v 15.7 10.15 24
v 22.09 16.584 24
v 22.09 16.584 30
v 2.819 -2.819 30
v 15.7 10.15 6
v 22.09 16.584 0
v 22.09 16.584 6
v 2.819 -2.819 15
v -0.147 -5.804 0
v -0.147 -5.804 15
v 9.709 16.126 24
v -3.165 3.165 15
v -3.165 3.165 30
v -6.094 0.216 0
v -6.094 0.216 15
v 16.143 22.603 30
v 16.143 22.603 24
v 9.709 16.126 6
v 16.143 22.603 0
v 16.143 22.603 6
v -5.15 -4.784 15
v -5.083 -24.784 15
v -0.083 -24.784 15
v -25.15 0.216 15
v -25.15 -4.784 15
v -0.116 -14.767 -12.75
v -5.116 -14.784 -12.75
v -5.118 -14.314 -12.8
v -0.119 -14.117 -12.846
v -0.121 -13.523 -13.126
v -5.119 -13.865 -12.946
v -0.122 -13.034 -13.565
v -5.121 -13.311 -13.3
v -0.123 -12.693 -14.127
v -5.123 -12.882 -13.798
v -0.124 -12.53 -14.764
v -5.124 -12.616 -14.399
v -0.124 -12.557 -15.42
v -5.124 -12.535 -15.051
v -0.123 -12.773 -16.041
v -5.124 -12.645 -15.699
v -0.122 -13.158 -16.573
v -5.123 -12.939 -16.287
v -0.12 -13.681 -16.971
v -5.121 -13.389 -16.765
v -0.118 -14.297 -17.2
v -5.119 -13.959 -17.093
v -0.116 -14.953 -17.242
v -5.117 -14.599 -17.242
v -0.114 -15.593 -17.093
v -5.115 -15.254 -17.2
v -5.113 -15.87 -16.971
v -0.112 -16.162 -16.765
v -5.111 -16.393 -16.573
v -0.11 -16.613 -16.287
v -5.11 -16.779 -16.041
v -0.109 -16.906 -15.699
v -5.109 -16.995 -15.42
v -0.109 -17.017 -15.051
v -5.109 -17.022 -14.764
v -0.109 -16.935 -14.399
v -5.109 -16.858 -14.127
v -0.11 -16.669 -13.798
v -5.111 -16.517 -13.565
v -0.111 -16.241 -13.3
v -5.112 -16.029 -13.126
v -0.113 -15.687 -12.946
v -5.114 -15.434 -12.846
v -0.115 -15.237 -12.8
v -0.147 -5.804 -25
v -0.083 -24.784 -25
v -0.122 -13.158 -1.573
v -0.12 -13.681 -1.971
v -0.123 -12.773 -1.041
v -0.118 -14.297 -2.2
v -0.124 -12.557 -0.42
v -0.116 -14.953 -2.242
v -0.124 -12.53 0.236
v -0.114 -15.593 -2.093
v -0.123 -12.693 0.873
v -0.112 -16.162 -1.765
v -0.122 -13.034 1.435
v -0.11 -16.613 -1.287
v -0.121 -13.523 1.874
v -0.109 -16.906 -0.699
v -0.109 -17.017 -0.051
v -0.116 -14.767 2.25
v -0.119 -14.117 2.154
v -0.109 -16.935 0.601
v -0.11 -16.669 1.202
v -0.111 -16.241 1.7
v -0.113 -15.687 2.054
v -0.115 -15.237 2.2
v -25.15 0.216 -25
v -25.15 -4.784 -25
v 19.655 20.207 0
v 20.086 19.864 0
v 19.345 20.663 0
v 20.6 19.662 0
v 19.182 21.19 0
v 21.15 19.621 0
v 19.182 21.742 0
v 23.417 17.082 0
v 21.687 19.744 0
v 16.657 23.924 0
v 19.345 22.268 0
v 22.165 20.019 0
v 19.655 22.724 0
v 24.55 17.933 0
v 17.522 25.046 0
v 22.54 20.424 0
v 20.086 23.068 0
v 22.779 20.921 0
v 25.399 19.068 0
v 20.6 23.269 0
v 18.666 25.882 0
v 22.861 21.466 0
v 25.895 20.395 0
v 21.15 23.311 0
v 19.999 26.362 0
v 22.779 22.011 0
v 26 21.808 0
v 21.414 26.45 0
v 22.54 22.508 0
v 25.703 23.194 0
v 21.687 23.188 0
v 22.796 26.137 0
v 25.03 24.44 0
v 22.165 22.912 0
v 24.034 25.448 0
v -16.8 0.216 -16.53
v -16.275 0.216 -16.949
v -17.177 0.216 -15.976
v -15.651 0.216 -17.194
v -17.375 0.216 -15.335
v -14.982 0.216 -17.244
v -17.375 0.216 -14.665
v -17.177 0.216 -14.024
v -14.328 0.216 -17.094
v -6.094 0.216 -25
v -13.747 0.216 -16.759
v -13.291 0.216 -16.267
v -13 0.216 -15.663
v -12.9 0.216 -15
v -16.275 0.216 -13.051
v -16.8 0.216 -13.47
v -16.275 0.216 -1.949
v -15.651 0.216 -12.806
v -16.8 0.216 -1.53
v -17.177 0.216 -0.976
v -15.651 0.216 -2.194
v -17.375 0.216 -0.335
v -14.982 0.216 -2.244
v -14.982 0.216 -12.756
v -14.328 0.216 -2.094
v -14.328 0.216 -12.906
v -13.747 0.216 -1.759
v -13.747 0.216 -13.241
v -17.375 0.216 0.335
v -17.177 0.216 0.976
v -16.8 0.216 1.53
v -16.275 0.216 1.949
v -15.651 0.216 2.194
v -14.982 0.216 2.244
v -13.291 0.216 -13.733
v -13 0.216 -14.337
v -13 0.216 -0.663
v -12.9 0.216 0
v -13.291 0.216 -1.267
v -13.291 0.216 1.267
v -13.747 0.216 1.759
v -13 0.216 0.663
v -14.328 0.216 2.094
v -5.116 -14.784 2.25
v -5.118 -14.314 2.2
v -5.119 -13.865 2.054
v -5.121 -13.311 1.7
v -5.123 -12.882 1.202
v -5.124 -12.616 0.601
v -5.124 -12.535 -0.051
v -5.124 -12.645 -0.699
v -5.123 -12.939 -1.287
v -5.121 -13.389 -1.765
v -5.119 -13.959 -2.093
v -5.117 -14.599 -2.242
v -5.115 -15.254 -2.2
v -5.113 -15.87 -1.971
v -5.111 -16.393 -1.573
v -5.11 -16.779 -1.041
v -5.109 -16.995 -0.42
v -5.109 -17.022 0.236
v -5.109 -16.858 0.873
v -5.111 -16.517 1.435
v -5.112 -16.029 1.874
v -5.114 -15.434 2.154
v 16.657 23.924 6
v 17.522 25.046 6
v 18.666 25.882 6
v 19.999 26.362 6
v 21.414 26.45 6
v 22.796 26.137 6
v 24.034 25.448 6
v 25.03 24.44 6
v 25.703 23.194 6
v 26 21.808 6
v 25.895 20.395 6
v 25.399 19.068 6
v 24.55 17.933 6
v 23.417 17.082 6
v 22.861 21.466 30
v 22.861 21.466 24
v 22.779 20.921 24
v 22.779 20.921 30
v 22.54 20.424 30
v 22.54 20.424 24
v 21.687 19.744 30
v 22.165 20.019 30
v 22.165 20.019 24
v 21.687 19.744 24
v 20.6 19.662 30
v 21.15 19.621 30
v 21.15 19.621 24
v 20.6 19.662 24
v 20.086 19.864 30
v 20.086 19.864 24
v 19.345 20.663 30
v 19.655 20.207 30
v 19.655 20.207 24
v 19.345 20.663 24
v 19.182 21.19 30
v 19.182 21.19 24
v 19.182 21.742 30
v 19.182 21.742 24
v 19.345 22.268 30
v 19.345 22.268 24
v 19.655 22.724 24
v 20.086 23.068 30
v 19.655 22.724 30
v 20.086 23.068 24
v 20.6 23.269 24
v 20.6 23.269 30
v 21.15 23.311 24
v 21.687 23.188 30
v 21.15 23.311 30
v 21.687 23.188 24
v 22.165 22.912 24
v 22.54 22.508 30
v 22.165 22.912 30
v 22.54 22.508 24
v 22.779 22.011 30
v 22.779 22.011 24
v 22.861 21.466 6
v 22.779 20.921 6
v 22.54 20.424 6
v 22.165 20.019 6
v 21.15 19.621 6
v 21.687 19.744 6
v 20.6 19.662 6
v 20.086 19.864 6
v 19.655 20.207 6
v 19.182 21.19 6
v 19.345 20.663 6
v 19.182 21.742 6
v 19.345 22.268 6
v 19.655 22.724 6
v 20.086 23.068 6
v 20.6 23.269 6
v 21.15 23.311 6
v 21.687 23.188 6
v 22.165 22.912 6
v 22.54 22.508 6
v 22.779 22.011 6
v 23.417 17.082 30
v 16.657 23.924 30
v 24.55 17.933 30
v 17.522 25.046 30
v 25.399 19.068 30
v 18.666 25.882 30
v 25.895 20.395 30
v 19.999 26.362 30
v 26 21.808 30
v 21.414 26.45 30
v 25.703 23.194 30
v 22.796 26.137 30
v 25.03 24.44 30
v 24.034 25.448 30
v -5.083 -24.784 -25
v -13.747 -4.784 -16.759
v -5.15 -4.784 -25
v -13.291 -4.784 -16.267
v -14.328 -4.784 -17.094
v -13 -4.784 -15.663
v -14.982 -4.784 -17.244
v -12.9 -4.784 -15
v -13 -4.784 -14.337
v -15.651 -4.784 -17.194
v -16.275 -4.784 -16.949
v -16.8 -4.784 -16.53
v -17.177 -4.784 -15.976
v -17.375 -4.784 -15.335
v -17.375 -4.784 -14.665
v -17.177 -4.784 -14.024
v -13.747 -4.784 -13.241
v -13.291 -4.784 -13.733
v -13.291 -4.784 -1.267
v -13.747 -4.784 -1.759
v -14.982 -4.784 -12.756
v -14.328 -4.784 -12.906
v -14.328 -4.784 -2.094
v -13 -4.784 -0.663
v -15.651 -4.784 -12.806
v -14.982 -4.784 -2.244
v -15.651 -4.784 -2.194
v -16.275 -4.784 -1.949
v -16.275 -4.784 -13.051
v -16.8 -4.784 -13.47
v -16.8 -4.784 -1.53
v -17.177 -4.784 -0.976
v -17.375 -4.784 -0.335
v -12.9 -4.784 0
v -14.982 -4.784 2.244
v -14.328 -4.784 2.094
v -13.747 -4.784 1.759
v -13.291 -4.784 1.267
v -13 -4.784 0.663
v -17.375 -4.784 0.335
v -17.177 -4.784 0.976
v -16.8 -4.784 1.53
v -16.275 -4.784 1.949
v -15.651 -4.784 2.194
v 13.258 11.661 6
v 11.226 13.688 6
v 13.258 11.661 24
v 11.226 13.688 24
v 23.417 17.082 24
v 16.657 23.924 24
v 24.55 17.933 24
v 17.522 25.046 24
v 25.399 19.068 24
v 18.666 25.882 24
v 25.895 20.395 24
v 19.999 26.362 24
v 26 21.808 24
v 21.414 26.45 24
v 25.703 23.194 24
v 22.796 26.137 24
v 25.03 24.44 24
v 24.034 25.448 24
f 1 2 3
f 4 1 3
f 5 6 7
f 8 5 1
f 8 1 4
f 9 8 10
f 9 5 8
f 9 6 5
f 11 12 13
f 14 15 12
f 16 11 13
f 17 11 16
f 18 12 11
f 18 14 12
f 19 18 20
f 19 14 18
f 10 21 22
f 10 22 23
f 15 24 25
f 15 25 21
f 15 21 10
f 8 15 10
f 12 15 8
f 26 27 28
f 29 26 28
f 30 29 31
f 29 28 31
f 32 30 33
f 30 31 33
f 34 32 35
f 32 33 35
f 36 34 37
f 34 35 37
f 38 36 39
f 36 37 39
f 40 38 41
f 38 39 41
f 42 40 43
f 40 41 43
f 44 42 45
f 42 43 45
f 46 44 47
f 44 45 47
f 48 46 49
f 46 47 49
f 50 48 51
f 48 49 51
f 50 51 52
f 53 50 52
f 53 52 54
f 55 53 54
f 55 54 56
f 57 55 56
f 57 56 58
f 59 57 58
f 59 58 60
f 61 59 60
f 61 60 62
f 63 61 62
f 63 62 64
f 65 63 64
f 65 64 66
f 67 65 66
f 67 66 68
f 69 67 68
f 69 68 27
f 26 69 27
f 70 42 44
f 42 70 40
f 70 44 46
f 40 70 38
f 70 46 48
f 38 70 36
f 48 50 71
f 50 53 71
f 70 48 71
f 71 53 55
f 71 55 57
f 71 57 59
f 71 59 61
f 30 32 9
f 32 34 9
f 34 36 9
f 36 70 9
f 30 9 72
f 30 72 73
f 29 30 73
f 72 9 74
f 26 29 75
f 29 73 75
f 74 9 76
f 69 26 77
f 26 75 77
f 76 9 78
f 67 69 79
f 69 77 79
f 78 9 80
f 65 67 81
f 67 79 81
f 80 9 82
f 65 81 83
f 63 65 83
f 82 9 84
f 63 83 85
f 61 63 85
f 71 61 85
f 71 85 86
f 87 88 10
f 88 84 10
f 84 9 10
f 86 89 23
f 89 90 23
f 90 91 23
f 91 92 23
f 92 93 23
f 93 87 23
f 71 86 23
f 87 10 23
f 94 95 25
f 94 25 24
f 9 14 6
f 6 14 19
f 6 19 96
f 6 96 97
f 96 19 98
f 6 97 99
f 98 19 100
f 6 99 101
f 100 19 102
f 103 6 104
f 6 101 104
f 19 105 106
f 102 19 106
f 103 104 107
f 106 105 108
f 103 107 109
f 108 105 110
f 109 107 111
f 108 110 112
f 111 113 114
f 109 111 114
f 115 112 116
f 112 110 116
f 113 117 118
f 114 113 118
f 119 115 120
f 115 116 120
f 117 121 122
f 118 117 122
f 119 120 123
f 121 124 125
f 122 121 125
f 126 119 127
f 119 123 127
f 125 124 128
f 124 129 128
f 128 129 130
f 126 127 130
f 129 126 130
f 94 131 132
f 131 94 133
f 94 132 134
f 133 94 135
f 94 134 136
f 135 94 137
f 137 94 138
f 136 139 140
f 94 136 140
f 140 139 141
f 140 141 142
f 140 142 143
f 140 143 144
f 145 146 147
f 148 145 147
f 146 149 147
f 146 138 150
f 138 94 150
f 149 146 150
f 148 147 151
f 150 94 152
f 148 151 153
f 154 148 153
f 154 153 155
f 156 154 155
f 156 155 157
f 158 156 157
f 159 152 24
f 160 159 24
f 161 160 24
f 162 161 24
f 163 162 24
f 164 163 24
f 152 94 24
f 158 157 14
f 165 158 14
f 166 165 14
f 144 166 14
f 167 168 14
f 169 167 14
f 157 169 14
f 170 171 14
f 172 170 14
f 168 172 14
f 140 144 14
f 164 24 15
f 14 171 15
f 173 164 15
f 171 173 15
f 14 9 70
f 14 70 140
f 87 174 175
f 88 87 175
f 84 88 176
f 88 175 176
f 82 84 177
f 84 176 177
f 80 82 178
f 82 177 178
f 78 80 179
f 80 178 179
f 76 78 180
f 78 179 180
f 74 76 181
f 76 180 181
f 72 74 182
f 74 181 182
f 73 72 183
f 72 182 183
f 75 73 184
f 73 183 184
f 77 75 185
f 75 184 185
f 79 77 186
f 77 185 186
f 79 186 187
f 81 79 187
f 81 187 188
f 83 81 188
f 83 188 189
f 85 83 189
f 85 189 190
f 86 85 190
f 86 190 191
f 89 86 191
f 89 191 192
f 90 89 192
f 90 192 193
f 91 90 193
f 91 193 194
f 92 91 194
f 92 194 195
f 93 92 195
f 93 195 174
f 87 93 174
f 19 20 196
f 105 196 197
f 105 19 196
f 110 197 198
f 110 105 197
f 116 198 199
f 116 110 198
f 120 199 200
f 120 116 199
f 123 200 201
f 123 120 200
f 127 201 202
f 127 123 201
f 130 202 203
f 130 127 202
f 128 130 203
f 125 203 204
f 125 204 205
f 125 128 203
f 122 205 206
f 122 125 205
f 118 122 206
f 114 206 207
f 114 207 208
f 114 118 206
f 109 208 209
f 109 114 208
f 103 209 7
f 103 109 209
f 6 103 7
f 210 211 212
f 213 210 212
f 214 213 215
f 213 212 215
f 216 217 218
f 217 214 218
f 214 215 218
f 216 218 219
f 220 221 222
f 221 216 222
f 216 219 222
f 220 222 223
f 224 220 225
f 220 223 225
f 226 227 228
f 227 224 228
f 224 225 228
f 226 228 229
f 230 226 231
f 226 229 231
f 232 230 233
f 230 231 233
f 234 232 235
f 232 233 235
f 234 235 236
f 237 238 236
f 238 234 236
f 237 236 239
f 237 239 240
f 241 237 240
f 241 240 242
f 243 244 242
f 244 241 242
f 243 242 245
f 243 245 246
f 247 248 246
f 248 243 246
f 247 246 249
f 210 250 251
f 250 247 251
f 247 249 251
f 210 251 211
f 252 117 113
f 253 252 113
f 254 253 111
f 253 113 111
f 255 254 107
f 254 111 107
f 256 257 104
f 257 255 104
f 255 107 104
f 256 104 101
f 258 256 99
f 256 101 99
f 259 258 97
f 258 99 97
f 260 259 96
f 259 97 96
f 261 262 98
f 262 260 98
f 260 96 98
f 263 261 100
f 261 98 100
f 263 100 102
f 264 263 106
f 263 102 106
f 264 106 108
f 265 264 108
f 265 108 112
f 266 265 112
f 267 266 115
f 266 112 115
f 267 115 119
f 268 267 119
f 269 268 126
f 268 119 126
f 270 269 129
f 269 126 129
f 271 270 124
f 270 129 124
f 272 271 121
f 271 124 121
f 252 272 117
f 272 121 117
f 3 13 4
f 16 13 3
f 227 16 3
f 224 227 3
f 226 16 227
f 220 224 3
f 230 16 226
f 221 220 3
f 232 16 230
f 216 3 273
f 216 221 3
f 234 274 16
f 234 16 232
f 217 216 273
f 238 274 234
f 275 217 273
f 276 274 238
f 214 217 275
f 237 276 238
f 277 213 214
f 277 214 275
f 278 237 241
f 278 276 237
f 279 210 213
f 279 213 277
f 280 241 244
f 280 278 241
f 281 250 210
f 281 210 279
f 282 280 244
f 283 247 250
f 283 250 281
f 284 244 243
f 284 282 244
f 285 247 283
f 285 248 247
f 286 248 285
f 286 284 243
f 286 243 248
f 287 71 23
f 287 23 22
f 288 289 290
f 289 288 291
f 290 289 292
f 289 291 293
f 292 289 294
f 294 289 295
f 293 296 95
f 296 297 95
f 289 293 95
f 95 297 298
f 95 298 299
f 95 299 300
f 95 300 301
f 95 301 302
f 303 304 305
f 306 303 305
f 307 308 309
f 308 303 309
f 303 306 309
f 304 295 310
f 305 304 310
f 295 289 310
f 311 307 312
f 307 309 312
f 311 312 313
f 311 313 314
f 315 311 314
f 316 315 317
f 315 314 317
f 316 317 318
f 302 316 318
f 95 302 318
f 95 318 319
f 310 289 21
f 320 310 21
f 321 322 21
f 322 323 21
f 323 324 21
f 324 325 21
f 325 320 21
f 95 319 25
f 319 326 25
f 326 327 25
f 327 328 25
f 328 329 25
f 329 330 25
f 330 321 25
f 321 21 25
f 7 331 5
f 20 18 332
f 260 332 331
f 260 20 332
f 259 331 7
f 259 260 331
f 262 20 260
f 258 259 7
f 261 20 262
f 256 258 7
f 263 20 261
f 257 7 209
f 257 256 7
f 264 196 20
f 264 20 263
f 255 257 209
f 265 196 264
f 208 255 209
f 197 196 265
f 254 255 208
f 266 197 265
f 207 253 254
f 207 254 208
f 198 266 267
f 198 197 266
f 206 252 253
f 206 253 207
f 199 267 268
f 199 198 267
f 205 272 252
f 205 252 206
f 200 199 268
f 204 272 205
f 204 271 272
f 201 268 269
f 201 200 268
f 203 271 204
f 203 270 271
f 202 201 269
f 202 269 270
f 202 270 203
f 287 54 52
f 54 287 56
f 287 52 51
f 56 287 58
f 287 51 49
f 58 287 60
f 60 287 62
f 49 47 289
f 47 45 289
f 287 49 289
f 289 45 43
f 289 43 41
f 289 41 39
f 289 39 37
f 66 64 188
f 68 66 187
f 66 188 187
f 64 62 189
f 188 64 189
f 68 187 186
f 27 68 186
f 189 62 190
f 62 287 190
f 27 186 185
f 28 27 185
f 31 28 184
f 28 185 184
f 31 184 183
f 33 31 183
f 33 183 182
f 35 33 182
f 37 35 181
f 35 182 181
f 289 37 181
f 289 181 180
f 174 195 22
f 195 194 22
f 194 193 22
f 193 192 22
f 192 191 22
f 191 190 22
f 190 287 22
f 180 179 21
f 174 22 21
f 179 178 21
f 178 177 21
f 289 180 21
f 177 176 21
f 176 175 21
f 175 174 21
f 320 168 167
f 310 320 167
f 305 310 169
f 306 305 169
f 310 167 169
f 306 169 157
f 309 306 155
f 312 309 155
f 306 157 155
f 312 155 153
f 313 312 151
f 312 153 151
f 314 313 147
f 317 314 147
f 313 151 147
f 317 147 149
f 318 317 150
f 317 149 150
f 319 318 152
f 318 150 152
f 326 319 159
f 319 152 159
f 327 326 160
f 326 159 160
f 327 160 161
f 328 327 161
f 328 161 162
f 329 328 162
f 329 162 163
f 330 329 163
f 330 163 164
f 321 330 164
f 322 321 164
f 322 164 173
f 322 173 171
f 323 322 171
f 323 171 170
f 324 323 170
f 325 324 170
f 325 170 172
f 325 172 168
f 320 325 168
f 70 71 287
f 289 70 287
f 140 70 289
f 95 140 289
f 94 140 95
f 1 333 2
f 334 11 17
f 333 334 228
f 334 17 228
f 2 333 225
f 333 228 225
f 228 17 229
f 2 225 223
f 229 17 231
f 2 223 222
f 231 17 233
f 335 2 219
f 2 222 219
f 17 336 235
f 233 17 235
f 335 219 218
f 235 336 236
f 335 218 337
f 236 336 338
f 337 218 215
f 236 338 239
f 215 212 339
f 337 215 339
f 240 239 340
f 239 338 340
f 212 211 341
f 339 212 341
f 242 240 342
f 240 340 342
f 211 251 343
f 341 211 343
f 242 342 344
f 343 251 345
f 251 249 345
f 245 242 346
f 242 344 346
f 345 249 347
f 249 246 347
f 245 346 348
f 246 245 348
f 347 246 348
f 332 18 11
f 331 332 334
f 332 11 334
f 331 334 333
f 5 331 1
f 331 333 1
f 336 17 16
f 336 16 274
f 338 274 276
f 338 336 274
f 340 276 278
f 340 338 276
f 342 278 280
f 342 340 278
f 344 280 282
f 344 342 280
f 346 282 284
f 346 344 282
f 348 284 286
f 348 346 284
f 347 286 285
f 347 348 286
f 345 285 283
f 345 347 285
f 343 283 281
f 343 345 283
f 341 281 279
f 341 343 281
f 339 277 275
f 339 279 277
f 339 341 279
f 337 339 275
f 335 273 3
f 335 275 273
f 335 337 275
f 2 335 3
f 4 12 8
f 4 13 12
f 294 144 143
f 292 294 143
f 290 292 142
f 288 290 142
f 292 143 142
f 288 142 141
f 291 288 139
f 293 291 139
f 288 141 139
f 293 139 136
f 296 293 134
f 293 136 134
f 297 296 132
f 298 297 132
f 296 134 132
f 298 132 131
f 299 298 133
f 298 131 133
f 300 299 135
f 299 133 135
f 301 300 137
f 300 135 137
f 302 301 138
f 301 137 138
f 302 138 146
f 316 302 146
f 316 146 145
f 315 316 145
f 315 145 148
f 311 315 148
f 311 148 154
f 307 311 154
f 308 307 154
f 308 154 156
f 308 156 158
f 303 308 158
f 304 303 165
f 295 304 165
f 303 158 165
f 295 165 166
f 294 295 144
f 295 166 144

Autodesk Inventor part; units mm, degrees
ref_plane "YZ Plane" through (0, 0, 0) normal (1, 0, 0) x (0, 1, 0)
ref_plane "XZ Plane" through (0, 0, 0) normal (0, 1, 0) x (-1, 0, 0)
ref_plane "XY Plane" through (0, 0, 0) normal (0, 0, 1) x (1, 0, 0)
sketch "Sketch1" plane through (0, 0, 0) normal (0, 0, 1) x (1, 0, 0)
  line L0 (-6.0944, 0.2158) -> (-25.1502, 0.2158)
  line L1 (-25.1502, 0.2158) -> (-25.1502, -4.7842)
  line L2 (-25.1502, -4.7842) -> (-5.1501, -4.7842)
  line L3 (-5.1501, -4.7842) -> (-5.0826, -24.7842)
  line L4 (-5.0826, -24.7842) -> (-0.0826, -24.7842)
  line L5 (-0.0826, -24.7842) -> (-0.1467, -5.8041)
  line L6 (-6.0944, 0.2158) -> (16.1426, 22.6034)
  line L7 (22.0903, 16.5836) -> (-0.1467, -5.8041)
  circle A0 centre (21.0114, 21.4658) radius 1.85
  arc A1 (22.0903, 16.5836) -> (16.1426, 22.6034) centre (21.0114, 21.4658) ccw
  dimension "d0" = 20
  dimension "d1" = 20
  dimension "d2" = 5
  dimension "d3" = 5
  dimension "d7" = 26.25
  dimension "d8" = 26.25
  dimension "d9" = 3.7
  dimension "d18" = 5
  dimension "d19" = 135
extrude "Extrusion1" add sketch "Sketch1" along normal blind 30
ref_plane "Work Plane1" through (0, 0, 24) normal (0, 0, 1) x (1, 0, 0)
sketch "Sketch3" plane through (0, 0, 24) normal (0, 0, 1) x (1, 0, 0)
  circle A0 centre (21.0114, 21.4658) radius 1.85 projected
  circle A1 centre (21.0114, 21.4658) radius 12.5
  point P0 (0, 0)
  dimension "d13" = 25
extrude "Extrusion3" cut sketch "Sketch3" against normal blind 18
sketch "Sketch5" plane through (0, 0, 0) normal (0, 0, -1) x (-1, 0, 0)
  circle A0 centre (-21.0114, 21.4658) radius 1.85 projected
  line L0 (25.1502, -4.7842) -> (25.1502, 0.2158) projected
  line L1 (25.1502, 0.2158) -> (6.0944, 0.2158) projected
  line L2 (6.0944, 0.2158) -> (-16.1426, 22.6034) projected
  arc A1 (-16.1426, 22.6034) -> (-22.0903, 16.5836) centre (-21.0114, 21.4658) ccw projected
  line L3 (-22.0903, 16.5836) -> (0.1467, -5.8041) projected
  line L4 (0.1467, -5.8041) -> (0.0826, -24.7842) projected
  line L5 (0.0826, -24.7842) -> (5.0826, -24.7842) projected
  line L6 (5.0826, -24.7842) -> (5.1501, -4.7842) projected
  line L7 (5.1501, -4.7842) -> (25.1502, -4.7842) projected
  line L8 (0.1467, -5.8041) -> (6.0944, 0.2158)
  point P0 (0, 0)
extrude "Extrusion5" add sketch "Sketch5" along normal blind 25 contours L7 L6 L5 L4 L8 L1 L0
sketch "Sketch8" plane through (-5.0826, -24.7842, -25) normal (-1, -0.0034, 0) x (0, 0, 1)
  circle A0 centre (10, 10) radius 2.25
  line L0 (55, 0) -> (0, 0) projected
  line L1 (0, 0) -> (0, 20.0001) projected
  circle A1 centre (25, 10) radius 2.25
  point P0 (25, 24.7669)
  dimension "d40" = 4.5
  dimension "d41" = 10
  dimension "d42" = 10
  dimension "d43" = 4.5
  dimension "d44" = 10
  dimension "d45" = 15
sketch "Sketch9" plane through (-25.1502, 0.2158, 30) normal (0, 1, 0) x (1, 0, 0)
  circle A0 centre (10, 45) radius 2.25
  circle A1 centre (10, 30) radius 2.25
  line L0 (0, 55) -> (19.0558, 55) projected
  line L1 (0, 0) -> (0, 55) projected
  point P0 (25.1502, 30)
  dimension "d46" = 10
  dimension "d47" = 10
  dimension "d48" = 10
  dimension "d49" = 15
  dimension "d50" = 4.5
  dimension "d51" = 4.5
extrude "Extrusion8" cut sketch "Sketch9" against normal mid plane 20
extrude "Extrusion9" cut sketch "Sketch8" against normal blind 20
sketch "Sketch10" plane through (0, 0, 30) normal (0, 0, 1) x (1, 0, 0)
  line L0 (-3.9108, 3.9108) -> (4.5333, -4.5333)
  line L1 (4.5333, -4.5333) -> (4.5333, -31.01)
  line L2 (4.5333, -31.01) -> (-28.169, -31.01)
  line L3 (-28.169, -31.01) -> (-28.169, 3.9108)
  line L4 (-28.169, 3.9108) -> (-3.9108, 3.9108)
  point P0 (0, 0)
  dimension "d56" = 135
  dimension "d57" = 0
extrude "Extrusion10" cut sketch "Sketch10" against normal blind 15
equation "\"d43\" = d40"
equation "\"d44\" = d41"
equation "\"RodDiameter\" = 8"
equation "\"VerticalBearingOD\" = 16"
equation "\"PrintingClearance\" = 0.2"
equation "\"TubeID\" = 18"
properties part number "PulleyHolderXY"
